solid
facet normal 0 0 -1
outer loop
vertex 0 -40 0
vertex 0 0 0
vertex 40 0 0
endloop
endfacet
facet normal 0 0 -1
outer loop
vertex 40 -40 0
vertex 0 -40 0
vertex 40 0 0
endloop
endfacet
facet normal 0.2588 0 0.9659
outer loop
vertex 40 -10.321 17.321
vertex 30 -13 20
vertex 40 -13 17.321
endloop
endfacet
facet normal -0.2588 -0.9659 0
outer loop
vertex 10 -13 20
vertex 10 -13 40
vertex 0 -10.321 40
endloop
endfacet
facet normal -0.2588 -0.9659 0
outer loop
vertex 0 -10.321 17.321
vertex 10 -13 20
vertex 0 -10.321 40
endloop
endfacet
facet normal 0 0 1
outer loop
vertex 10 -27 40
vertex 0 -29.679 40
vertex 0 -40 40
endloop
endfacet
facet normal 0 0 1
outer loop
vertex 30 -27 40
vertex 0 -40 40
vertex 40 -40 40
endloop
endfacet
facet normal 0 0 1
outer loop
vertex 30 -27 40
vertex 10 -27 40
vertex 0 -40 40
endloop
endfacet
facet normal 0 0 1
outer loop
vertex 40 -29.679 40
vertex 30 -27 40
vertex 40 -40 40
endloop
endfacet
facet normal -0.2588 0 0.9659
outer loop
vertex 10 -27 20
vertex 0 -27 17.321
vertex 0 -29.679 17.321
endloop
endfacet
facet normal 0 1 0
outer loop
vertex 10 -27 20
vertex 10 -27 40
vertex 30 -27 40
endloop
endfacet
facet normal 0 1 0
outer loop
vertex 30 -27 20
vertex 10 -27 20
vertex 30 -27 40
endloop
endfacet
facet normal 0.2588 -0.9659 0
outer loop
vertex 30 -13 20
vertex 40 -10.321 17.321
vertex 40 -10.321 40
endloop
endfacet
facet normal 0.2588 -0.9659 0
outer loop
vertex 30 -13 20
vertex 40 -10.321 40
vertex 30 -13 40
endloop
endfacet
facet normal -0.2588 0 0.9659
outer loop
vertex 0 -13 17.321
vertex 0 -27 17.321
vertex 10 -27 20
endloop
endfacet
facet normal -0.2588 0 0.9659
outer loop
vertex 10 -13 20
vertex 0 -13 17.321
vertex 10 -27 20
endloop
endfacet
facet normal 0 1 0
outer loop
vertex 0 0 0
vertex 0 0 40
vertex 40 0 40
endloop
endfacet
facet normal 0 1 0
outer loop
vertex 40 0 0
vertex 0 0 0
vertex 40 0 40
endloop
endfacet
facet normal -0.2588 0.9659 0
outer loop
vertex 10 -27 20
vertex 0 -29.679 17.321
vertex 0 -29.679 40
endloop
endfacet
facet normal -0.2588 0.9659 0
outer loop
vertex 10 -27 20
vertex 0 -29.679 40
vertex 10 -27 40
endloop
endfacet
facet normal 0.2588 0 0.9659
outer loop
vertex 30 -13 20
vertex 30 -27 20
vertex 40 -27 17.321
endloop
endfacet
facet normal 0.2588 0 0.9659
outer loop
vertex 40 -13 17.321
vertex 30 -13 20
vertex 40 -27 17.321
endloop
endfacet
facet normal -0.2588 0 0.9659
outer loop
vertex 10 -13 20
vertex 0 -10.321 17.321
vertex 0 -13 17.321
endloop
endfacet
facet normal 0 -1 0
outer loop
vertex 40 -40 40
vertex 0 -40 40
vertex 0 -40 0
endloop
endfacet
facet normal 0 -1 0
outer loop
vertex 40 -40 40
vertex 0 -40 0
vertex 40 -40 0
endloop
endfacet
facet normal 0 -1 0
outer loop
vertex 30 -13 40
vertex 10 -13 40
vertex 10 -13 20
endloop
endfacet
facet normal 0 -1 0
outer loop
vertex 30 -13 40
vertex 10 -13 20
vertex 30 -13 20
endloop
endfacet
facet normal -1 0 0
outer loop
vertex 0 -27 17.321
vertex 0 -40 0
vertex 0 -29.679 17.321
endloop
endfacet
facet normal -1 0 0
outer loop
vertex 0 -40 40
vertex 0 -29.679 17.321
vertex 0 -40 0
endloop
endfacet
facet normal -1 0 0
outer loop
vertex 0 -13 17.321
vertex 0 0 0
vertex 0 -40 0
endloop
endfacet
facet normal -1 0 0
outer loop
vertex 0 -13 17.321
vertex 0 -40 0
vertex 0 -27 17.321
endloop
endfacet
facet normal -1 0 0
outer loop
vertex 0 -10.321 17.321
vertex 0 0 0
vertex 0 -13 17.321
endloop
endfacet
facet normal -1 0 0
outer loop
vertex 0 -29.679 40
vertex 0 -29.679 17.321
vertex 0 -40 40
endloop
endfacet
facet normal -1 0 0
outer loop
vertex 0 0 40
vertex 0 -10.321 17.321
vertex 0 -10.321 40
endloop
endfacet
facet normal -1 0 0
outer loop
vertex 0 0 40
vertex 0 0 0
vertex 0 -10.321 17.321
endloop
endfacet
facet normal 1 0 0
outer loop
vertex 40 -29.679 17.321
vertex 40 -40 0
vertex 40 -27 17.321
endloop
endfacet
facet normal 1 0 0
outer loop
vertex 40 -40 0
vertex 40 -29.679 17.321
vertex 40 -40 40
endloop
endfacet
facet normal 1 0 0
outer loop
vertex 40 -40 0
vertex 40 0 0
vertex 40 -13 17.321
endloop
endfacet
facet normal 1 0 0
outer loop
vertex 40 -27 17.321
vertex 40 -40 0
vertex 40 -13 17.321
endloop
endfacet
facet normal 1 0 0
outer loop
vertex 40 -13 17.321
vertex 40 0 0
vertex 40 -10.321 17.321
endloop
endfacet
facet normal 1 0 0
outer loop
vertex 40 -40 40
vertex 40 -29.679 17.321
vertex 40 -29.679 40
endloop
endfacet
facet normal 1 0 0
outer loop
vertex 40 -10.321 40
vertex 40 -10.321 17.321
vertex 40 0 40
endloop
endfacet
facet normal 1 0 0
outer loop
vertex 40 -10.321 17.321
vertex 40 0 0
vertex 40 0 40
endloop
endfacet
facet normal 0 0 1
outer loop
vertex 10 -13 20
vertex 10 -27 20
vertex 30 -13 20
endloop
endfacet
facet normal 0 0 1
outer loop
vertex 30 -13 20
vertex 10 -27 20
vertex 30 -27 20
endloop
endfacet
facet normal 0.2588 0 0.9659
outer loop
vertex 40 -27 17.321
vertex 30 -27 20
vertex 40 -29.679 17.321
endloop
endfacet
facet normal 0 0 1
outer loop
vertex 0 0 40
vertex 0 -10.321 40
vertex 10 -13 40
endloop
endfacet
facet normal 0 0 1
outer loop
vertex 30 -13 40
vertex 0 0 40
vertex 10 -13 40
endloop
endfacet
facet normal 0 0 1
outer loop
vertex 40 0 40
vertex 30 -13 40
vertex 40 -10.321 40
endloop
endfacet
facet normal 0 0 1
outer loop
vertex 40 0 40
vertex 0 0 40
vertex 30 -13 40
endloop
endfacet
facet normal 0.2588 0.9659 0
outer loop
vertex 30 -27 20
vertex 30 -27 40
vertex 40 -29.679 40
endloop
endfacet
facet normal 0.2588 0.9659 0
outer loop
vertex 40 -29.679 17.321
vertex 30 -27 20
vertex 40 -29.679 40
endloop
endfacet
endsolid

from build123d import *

# Parameters (mm, degrees)
F0_W     = 40
F0_H     = 40
F1_DEPTH = 40
F4_DEPTH = 7
F6_REACH = 50.3537618041
F8_REACH = 50.3537618041


with BuildPart() as f1:
    # F0 (on Front) → F1 (new body)
    with BuildSketch(Plane.XZ):
        with Locations((20, 20)):
            Rectangle(F0_W, F0_H)
    extrude(amount=F1_DEPTH)

    # F3 (on offset) → F4 (cut, symmetric)
    with BuildSketch(Plane.XZ.offset(20)):
        Polygon((0, 40), (0, 17.3205080757), (10, 20), (30, 20), (40, 17.3205080757), (40, 40), align=None)
    extrude(amount=F4_DEPTH, both=True, mode=Mode.SUBTRACT)

    f6_end = Plane(origin=(5, -20, 18.6602540378), x_dir=(0.9659258263, 0, 0.2588190451), z_dir=(-0.2588190451, 0, 0.9659258263))
    # F5 (on face) → F6 (cut, up to a plane its end follows)
    with BuildSketch(Plane.XY.offset(40)):
        Polygon((10, -13), (0, -10.3205080757), (0, -13), align=None)
        Polygon((0, -27), (0, -29.6794919243), (10, -27), align=None)
    f6_long = extrude(amount=-F6_REACH, mode=Mode.PRIVATE)
    add(split(f6_long, bisect_by=f6_end, keep=Keep.TOP, mode=Mode.PRIVATE), mode=Mode.SUBTRACT)

    f8_end = Plane(origin=(35, -20, 18.6602540378), x_dir=(0.9659258263, 0, -0.2588190451), z_dir=(0.2588190451, 0, 0.9659258263))
    # F7 (on face) → F8 (cut, up to a plane its end follows)
    with BuildSketch(Plane.XY.offset(40)):
        Polygon((40, -10.3205080757), (30, -13), (40, -13), align=None)
        Polygon((40, -27), (30, -27), (40, -29.6794919243), align=None)
    f8_long = extrude(amount=-F8_REACH, mode=Mode.PRIVATE)
    add(split(f8_long, bisect_by=f8_end, keep=Keep.TOP, mode=Mode.PRIVATE), mode=Mode.SUBTRACT)


solid = f1.part
